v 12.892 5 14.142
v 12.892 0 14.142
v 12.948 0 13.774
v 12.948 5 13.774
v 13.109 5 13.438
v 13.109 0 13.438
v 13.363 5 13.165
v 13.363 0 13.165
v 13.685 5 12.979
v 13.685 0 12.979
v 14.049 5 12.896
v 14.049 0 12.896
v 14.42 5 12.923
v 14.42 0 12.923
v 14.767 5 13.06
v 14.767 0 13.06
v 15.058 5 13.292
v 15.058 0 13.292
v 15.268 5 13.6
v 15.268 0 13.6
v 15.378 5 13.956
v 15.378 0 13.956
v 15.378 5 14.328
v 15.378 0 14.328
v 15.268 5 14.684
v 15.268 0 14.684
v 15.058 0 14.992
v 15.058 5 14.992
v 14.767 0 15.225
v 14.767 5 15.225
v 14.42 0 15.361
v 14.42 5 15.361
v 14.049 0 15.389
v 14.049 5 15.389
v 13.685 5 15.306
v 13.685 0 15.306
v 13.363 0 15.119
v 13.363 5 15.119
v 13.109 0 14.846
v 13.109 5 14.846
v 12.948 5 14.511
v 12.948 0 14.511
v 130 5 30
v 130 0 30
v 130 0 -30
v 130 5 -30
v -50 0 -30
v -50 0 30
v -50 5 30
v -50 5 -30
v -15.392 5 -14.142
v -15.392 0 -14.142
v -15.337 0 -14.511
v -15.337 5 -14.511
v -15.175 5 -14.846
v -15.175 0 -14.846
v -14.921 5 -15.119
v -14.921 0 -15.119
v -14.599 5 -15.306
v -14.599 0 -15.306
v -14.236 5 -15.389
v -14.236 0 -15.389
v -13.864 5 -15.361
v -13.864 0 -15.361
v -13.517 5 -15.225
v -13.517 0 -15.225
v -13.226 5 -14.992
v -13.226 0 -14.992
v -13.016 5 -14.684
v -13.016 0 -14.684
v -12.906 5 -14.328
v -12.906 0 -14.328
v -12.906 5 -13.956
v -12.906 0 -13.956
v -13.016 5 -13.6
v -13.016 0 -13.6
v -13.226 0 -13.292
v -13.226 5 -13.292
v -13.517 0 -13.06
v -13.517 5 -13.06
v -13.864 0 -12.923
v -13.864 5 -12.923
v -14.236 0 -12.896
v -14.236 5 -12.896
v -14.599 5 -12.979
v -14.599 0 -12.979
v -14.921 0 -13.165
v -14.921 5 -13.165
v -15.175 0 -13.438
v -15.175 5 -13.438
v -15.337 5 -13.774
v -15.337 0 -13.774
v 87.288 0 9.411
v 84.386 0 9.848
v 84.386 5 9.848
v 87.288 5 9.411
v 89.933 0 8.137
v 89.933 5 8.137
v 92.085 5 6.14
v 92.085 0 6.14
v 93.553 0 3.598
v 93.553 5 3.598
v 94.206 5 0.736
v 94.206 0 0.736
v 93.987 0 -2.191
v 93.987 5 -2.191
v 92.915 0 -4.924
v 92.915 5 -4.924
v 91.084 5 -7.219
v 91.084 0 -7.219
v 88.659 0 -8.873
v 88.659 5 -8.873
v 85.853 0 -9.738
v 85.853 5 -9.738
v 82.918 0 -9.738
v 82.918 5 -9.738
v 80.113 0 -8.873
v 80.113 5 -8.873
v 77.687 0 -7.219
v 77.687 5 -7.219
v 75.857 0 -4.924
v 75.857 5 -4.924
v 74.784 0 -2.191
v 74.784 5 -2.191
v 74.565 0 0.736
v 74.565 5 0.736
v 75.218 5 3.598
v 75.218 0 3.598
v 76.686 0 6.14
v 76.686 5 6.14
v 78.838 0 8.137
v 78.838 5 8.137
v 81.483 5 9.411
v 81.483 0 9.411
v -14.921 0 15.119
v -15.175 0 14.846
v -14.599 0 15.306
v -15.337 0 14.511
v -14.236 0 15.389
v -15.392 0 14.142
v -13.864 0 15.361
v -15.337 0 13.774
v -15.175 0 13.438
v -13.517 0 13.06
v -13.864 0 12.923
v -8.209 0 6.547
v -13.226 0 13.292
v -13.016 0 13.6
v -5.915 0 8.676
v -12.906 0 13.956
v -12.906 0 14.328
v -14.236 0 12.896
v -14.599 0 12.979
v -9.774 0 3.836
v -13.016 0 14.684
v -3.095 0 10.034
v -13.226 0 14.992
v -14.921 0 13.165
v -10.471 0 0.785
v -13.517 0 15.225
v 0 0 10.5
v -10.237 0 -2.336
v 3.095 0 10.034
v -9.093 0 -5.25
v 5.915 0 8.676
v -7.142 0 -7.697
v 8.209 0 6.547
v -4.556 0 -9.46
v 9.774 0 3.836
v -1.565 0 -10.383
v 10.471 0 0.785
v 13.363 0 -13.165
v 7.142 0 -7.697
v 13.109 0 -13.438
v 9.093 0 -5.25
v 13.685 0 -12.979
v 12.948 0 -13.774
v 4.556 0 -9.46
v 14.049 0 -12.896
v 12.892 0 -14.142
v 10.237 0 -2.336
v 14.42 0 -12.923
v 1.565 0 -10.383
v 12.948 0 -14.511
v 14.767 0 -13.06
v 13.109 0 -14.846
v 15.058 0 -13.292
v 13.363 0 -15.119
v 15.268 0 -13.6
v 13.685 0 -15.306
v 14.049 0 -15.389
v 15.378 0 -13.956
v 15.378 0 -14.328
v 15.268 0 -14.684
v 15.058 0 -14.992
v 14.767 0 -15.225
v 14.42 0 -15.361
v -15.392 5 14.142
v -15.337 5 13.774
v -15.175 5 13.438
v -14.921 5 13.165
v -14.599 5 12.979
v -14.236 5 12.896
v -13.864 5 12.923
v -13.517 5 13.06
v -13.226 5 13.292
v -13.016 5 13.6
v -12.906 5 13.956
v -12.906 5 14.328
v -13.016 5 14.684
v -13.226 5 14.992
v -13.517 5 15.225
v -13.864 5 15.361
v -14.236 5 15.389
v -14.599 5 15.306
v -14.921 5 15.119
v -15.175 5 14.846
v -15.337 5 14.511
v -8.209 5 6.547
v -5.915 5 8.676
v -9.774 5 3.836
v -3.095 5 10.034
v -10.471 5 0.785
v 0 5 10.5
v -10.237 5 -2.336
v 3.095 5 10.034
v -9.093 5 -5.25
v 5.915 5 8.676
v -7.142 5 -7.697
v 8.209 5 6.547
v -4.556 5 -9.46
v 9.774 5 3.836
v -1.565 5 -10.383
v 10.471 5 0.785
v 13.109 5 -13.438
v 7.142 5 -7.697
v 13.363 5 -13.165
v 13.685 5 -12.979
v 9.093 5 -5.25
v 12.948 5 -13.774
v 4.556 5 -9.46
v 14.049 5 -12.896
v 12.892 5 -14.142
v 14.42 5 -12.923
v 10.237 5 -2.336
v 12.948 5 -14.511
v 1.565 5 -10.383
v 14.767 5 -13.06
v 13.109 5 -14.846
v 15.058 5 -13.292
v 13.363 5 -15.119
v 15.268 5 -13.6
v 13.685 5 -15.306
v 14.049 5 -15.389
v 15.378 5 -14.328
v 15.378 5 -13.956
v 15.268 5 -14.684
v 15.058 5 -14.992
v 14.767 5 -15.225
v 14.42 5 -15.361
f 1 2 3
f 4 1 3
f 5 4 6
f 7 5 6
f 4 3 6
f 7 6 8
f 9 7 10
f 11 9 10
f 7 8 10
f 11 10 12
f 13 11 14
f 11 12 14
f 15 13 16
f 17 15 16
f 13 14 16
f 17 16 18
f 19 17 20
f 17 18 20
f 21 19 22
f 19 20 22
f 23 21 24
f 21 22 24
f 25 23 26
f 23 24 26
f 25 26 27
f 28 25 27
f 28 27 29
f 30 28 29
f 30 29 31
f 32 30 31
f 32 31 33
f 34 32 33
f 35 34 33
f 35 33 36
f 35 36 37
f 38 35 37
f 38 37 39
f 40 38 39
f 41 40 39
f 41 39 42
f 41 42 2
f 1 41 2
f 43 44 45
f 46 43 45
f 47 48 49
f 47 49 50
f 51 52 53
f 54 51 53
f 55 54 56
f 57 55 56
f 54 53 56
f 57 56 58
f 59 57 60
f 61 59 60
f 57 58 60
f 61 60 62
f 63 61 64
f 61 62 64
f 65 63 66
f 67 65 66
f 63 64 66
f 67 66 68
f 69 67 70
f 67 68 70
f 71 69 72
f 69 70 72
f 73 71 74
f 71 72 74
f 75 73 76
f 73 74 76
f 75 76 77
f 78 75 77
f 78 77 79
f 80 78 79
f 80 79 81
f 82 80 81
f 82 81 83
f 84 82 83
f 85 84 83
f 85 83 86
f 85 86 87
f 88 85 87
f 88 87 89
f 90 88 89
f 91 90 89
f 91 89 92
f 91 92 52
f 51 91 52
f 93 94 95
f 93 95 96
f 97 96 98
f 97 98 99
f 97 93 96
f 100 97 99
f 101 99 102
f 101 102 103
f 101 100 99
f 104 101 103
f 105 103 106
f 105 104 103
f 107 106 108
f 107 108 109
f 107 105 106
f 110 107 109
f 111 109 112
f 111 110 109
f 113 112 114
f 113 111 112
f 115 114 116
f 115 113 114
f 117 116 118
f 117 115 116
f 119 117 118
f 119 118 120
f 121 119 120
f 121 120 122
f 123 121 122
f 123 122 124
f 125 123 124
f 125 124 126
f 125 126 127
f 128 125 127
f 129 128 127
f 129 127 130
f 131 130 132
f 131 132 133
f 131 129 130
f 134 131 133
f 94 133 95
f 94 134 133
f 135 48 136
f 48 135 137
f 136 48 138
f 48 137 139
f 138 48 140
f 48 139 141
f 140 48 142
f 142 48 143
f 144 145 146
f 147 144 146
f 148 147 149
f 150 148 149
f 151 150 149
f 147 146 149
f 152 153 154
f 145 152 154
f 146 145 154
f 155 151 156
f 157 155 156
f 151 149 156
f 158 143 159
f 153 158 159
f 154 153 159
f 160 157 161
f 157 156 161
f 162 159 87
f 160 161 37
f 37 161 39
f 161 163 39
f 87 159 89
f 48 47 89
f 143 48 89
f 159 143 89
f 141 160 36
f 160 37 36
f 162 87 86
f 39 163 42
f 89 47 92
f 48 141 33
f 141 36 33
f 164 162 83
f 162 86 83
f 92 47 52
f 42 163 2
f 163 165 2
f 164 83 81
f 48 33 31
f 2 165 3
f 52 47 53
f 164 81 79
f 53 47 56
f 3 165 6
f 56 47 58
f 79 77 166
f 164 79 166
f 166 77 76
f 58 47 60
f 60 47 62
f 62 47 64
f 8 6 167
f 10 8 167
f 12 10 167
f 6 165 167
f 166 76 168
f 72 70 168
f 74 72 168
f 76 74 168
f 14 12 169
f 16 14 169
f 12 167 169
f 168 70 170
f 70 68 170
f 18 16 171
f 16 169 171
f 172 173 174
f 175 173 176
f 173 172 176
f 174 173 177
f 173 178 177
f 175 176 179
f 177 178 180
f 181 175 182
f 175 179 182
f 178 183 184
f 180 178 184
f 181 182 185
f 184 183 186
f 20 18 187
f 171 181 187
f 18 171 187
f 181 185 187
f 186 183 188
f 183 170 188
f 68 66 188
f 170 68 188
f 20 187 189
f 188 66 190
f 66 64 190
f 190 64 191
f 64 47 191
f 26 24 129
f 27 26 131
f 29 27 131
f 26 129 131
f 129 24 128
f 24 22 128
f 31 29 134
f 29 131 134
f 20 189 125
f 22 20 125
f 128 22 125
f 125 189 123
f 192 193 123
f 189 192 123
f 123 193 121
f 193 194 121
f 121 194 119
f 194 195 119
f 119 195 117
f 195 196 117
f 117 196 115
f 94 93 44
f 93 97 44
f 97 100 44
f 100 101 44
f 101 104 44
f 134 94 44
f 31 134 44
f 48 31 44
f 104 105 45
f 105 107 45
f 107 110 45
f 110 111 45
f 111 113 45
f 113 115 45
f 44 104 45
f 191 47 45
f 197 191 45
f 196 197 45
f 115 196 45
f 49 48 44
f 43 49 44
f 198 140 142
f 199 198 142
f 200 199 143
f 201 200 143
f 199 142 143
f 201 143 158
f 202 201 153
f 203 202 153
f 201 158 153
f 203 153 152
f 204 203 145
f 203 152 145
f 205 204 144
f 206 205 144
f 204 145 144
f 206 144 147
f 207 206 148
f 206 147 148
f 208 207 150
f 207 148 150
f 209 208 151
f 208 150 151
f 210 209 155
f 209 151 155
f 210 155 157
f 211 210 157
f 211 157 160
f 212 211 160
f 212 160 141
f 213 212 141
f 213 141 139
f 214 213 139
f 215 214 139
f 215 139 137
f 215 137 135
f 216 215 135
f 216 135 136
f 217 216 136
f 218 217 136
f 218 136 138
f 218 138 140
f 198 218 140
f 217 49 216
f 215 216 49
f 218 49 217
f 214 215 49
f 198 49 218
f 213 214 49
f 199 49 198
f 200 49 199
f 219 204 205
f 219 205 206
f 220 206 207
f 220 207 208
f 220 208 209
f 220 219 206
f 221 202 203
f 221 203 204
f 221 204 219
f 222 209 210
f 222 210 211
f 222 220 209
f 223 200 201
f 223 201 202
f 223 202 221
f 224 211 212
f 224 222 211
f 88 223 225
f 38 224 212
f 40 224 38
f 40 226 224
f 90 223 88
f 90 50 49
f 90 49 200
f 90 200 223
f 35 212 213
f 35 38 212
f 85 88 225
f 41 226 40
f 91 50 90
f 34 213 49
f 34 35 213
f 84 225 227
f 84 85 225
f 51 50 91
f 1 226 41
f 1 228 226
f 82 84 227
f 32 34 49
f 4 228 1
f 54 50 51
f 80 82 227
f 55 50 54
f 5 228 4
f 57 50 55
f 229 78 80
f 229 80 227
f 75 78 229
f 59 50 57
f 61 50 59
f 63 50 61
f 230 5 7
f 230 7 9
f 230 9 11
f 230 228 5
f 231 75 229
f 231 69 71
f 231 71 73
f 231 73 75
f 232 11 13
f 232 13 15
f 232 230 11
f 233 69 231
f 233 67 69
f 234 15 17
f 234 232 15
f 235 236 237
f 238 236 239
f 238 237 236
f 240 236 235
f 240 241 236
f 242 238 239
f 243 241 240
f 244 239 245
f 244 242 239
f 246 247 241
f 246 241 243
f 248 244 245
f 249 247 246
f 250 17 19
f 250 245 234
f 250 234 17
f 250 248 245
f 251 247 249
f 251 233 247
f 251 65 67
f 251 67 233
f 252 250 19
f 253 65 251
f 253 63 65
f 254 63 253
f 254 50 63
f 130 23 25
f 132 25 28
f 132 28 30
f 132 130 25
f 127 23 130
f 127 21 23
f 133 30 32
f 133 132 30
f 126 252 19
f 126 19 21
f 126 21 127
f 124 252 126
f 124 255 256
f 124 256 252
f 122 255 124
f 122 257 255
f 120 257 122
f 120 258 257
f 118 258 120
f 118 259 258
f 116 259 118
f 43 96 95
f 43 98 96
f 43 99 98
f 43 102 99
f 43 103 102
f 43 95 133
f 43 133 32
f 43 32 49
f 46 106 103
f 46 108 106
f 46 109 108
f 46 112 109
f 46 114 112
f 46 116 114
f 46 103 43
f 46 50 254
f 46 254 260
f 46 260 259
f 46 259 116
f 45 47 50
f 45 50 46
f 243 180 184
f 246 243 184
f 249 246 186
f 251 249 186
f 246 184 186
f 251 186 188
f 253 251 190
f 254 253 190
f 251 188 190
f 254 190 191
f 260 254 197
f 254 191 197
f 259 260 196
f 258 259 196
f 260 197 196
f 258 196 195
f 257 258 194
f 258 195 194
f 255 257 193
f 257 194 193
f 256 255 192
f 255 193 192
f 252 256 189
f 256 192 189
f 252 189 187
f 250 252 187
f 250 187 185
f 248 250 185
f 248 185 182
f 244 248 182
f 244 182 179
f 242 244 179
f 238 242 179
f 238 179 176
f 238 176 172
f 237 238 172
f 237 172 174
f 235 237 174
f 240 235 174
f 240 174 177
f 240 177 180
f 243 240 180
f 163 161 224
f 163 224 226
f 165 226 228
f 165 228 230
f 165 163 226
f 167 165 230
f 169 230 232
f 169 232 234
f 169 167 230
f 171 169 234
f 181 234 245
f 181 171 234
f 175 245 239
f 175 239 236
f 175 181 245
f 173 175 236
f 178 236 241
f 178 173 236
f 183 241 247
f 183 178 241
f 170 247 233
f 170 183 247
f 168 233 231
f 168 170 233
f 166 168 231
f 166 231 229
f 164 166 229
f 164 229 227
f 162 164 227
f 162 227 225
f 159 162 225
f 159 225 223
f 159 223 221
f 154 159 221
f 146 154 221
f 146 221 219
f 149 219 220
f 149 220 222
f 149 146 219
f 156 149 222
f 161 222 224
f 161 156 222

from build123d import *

# Parameters (mm, degrees)
SKETCH1_W             = 180
SKETCH1_H             = 60
SKETCH1_R             = 10.5
SKETCH1_R_2           = 9.848320848
BOSS_EXTRUDE1_DEPTH   = 5
M3X0_5_TAPPED_HOLE1_D = 2.5


with BuildPart() as part:
    # Sketch1 → Boss-Extrude1 (new body)
    with BuildSketch(Plane(origin=(0, 0, 0), x_dir=(1, 0, 0), z_dir=(0, 1, 0))):
        with Locations((40, 0)):
            Rectangle(SKETCH1_W, SKETCH1_H)
        with Locations(Location((0, 0, 0), (0, 0, 270))):
            Circle(SKETCH1_R, mode=Mode.SUBTRACT)
        with Locations(Location((84.38561279, 0, 0), (0, 0, 270))):
            Circle(SKETCH1_R_2, mode=Mode.SUBTRACT)
    extrude(amount=BOSS_EXTRUDE1_DEPTH)

    # M3x0.5 Tapped Hole1 (through all)
    with Locations(Plane(origin=(0, 5, 0), x_dir=(1, 0, 0), z_dir=(0, 1, 0))):
        with Locations((-14.142135624, 14.142135624), (14.142135624, 14.142135624), (14.142135624, -14.142135624), (-14.142135624, -14.142135624), (0, 0)):
            Hole(M3X0_5_TAPPED_HOLE1_D / 2)


solid = part.part
